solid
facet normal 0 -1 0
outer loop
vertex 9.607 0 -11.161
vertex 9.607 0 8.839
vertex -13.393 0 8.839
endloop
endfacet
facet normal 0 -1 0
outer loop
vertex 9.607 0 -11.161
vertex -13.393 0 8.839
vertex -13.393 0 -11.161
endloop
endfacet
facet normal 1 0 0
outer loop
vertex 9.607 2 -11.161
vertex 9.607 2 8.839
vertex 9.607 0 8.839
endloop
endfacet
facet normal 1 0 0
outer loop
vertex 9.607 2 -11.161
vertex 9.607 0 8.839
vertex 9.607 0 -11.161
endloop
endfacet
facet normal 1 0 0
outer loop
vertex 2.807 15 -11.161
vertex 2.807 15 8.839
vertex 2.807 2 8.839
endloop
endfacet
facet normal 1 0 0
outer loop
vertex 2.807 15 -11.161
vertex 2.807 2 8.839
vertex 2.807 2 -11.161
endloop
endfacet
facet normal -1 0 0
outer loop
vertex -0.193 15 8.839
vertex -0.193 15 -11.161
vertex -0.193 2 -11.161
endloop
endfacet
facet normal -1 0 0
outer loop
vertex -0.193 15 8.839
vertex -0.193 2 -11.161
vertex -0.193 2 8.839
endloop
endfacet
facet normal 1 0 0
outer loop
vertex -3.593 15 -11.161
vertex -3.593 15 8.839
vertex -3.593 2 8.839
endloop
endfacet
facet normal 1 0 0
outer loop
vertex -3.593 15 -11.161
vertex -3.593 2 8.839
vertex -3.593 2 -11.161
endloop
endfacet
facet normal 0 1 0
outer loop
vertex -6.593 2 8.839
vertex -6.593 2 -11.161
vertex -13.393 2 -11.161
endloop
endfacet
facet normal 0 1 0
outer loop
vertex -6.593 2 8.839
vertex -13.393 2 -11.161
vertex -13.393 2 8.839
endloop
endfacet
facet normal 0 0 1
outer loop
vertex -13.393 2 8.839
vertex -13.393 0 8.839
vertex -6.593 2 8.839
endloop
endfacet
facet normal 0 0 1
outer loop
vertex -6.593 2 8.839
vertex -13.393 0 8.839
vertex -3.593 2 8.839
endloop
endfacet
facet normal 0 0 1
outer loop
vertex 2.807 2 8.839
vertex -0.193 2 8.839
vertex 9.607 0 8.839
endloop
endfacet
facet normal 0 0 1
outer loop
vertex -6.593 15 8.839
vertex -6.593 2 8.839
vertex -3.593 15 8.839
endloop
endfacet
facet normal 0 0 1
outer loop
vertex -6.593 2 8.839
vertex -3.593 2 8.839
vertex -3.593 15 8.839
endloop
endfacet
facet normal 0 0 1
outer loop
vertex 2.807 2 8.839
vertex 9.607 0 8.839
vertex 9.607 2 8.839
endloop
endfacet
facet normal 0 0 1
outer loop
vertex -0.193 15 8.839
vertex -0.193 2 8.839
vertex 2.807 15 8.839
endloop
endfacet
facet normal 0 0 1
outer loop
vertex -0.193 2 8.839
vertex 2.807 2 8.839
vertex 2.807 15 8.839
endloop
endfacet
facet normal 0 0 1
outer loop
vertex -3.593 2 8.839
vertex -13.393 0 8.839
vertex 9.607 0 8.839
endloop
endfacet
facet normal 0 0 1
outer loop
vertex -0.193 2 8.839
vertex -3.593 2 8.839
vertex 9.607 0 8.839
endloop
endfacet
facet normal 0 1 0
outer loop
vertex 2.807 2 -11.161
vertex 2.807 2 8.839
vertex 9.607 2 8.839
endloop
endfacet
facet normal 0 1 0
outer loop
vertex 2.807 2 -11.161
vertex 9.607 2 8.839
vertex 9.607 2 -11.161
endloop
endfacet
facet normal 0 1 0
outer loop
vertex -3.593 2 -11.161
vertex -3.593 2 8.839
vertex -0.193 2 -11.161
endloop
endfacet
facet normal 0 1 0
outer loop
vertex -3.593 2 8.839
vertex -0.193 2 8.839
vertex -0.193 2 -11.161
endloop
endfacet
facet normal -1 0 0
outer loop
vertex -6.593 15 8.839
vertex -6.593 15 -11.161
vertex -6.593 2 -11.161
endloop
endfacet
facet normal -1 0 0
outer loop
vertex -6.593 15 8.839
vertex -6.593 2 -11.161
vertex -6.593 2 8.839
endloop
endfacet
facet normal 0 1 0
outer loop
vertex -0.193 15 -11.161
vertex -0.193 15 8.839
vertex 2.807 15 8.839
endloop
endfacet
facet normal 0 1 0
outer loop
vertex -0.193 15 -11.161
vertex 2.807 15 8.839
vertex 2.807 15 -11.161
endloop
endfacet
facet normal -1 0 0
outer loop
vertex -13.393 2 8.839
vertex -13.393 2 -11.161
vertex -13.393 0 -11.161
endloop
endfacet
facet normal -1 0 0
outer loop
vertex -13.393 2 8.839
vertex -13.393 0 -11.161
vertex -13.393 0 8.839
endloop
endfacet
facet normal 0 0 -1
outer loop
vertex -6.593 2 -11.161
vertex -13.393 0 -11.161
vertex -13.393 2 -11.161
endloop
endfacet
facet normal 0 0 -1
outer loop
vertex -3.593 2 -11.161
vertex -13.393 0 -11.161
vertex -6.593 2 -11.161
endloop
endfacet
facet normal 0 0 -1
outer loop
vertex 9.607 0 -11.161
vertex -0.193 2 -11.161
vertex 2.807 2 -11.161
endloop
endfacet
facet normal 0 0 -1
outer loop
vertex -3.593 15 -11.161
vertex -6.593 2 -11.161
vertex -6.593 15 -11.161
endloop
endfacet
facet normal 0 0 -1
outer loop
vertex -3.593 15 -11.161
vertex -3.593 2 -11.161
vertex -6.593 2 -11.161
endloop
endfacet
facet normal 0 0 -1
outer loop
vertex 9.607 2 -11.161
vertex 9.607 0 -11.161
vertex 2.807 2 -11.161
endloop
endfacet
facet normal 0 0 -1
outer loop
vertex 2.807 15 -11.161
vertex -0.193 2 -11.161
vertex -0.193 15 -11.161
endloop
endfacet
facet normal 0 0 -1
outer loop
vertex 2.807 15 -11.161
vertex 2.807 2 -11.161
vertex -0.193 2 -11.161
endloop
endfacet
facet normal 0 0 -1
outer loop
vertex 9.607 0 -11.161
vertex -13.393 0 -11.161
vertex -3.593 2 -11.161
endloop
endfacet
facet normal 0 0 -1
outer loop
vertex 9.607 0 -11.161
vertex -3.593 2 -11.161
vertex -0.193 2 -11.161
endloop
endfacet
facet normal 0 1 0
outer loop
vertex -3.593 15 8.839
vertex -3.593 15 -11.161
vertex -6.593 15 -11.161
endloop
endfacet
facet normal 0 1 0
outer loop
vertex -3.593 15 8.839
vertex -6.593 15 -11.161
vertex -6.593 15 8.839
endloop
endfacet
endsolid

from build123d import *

# Parameters (mm, degrees)
ESQUISSE1_W             = 13
ESQUISSE1_H             = 20
BOSS_EXTRU_1_DEPTH      = 15
ESQUISSE2_W             = 2
ESQUISSE2_H             = 20
ESQUISSE2_W_2           = 3
ENL_V_MAT_EXTRU_2_DEPTH = 13
ESQUISSE4_W             = 20
ESQUISSE4_H             = 2
BOSS_EXTRU_2_DEPTH      = 5
ESQUISSE5_W             = 20
ESQUISSE5_H             = 2
BOSS_EXTRU_3_DEPTH      = 5
ESQUISSE6_W             = 20
ESQUISSE6_H             = 13
ENL_V_MAT_EXTRU_3_DEPTH = 0.2
ESQUISSE7_W             = 20
ESQUISSE7_H             = 13
ENL_V_MAT_EXTRU_4_DEPTH = 0.2
ESQUISSE8_W             = 20
ESQUISSE8_H             = 13
BOSS_EXTRU_4_DEPTH      = 0.2
ESQUISSE9_W             = 20
ESQUISSE9_H             = 13
BOSS_EXTRU_5_DEPTH      = 0.2


with BuildPart() as part:
    # Esquisse1 → Boss.-Extru.1 (new body)
    with BuildSketch(Plane(origin=(0, 0, 0), x_dir=(1, 0, 0), z_dir=(0, 1, 0))):
        with Locations((-1.892857143, 1.160714286)):
            Rectangle(ESQUISSE1_W, ESQUISSE1_H)
    extrude(amount=BOSS_EXTRU_1_DEPTH)

    # Esquisse2 → Enlèv. mat.-Extru.2 (cut)
    with BuildSketch(Plane(origin=(0, 15, 0), x_dir=(1, 0, 0), z_dir=(0, 1, 0))):
        with Locations((-7.392857143, 1.160714286)):
            Rectangle(ESQUISSE2_W, ESQUISSE2_H)
        with Locations((-1.892857143, 1.160714286)):
            Rectangle(ESQUISSE2_W_2, ESQUISSE2_H)
        with Locations((3.607142857, 1.160714286)):
            Rectangle(ESQUISSE2_W, ESQUISSE2_H)
    extrude(amount=-ENL_V_MAT_EXTRU_2_DEPTH, mode=Mode.SUBTRACT)

    # Esquisse4 → Boss.-Extru.2 (add)
    with BuildSketch(Plane.ZY.offset(8.392857143)):
        with Locations((-1.160714286, 1)):
            Rectangle(ESQUISSE4_W, ESQUISSE4_H)
    extrude(amount=BOSS_EXTRU_2_DEPTH)

    # Esquisse5 → Boss.-Extru.3 (add)
    with BuildSketch(Plane(origin=(4.607142857, 0, 0), x_dir=(0, 0, -1), z_dir=(1, 0, 0))):
        with Locations((1.160714286, 1)):
            Rectangle(ESQUISSE5_W, ESQUISSE5_H)
    extrude(amount=BOSS_EXTRU_3_DEPTH)

    # Esquisse6 → Enlèv. mat.-Extru.3 (cut)
    with BuildSketch(Plane.ZY.offset(0.392857143)):
        with Locations((-1.160714286, 8.5)):
            Rectangle(ESQUISSE6_W, ESQUISSE6_H)
    extrude(amount=-ENL_V_MAT_EXTRU_3_DEPTH, mode=Mode.SUBTRACT)

    # Esquisse7 → Enlèv. mat.-Extru.4 (cut)
    with BuildSketch(Plane(origin=(-3.392857143, 0, 0), x_dir=(0, 0, -1), z_dir=(1, 0, 0))):
        with Locations((1.160714286, 8.5)):
            Rectangle(ESQUISSE7_W, ESQUISSE7_H)
    extrude(amount=-ENL_V_MAT_EXTRU_4_DEPTH, mode=Mode.SUBTRACT)

    # Esquisse8 → Boss.-Extru.4 (add)
    with BuildSketch(Plane(origin=(2.607142857, 0, 0), x_dir=(0, 0, -1), z_dir=(1, 0, 0))):
        with Locations((1.160714286, 8.5)):
            Rectangle(ESQUISSE8_W, ESQUISSE8_H)
    extrude(amount=BOSS_EXTRU_4_DEPTH)

    # Esquisse9 → Boss.-Extru.5 (add)
    with BuildSketch(Plane.ZY.offset(6.392857143)):
        with Locations((-1.160714286, 8.5)):
            Rectangle(ESQUISSE9_W, ESQUISSE9_H)
    extrude(amount=BOSS_EXTRU_5_DEPTH)


solid = part.part
